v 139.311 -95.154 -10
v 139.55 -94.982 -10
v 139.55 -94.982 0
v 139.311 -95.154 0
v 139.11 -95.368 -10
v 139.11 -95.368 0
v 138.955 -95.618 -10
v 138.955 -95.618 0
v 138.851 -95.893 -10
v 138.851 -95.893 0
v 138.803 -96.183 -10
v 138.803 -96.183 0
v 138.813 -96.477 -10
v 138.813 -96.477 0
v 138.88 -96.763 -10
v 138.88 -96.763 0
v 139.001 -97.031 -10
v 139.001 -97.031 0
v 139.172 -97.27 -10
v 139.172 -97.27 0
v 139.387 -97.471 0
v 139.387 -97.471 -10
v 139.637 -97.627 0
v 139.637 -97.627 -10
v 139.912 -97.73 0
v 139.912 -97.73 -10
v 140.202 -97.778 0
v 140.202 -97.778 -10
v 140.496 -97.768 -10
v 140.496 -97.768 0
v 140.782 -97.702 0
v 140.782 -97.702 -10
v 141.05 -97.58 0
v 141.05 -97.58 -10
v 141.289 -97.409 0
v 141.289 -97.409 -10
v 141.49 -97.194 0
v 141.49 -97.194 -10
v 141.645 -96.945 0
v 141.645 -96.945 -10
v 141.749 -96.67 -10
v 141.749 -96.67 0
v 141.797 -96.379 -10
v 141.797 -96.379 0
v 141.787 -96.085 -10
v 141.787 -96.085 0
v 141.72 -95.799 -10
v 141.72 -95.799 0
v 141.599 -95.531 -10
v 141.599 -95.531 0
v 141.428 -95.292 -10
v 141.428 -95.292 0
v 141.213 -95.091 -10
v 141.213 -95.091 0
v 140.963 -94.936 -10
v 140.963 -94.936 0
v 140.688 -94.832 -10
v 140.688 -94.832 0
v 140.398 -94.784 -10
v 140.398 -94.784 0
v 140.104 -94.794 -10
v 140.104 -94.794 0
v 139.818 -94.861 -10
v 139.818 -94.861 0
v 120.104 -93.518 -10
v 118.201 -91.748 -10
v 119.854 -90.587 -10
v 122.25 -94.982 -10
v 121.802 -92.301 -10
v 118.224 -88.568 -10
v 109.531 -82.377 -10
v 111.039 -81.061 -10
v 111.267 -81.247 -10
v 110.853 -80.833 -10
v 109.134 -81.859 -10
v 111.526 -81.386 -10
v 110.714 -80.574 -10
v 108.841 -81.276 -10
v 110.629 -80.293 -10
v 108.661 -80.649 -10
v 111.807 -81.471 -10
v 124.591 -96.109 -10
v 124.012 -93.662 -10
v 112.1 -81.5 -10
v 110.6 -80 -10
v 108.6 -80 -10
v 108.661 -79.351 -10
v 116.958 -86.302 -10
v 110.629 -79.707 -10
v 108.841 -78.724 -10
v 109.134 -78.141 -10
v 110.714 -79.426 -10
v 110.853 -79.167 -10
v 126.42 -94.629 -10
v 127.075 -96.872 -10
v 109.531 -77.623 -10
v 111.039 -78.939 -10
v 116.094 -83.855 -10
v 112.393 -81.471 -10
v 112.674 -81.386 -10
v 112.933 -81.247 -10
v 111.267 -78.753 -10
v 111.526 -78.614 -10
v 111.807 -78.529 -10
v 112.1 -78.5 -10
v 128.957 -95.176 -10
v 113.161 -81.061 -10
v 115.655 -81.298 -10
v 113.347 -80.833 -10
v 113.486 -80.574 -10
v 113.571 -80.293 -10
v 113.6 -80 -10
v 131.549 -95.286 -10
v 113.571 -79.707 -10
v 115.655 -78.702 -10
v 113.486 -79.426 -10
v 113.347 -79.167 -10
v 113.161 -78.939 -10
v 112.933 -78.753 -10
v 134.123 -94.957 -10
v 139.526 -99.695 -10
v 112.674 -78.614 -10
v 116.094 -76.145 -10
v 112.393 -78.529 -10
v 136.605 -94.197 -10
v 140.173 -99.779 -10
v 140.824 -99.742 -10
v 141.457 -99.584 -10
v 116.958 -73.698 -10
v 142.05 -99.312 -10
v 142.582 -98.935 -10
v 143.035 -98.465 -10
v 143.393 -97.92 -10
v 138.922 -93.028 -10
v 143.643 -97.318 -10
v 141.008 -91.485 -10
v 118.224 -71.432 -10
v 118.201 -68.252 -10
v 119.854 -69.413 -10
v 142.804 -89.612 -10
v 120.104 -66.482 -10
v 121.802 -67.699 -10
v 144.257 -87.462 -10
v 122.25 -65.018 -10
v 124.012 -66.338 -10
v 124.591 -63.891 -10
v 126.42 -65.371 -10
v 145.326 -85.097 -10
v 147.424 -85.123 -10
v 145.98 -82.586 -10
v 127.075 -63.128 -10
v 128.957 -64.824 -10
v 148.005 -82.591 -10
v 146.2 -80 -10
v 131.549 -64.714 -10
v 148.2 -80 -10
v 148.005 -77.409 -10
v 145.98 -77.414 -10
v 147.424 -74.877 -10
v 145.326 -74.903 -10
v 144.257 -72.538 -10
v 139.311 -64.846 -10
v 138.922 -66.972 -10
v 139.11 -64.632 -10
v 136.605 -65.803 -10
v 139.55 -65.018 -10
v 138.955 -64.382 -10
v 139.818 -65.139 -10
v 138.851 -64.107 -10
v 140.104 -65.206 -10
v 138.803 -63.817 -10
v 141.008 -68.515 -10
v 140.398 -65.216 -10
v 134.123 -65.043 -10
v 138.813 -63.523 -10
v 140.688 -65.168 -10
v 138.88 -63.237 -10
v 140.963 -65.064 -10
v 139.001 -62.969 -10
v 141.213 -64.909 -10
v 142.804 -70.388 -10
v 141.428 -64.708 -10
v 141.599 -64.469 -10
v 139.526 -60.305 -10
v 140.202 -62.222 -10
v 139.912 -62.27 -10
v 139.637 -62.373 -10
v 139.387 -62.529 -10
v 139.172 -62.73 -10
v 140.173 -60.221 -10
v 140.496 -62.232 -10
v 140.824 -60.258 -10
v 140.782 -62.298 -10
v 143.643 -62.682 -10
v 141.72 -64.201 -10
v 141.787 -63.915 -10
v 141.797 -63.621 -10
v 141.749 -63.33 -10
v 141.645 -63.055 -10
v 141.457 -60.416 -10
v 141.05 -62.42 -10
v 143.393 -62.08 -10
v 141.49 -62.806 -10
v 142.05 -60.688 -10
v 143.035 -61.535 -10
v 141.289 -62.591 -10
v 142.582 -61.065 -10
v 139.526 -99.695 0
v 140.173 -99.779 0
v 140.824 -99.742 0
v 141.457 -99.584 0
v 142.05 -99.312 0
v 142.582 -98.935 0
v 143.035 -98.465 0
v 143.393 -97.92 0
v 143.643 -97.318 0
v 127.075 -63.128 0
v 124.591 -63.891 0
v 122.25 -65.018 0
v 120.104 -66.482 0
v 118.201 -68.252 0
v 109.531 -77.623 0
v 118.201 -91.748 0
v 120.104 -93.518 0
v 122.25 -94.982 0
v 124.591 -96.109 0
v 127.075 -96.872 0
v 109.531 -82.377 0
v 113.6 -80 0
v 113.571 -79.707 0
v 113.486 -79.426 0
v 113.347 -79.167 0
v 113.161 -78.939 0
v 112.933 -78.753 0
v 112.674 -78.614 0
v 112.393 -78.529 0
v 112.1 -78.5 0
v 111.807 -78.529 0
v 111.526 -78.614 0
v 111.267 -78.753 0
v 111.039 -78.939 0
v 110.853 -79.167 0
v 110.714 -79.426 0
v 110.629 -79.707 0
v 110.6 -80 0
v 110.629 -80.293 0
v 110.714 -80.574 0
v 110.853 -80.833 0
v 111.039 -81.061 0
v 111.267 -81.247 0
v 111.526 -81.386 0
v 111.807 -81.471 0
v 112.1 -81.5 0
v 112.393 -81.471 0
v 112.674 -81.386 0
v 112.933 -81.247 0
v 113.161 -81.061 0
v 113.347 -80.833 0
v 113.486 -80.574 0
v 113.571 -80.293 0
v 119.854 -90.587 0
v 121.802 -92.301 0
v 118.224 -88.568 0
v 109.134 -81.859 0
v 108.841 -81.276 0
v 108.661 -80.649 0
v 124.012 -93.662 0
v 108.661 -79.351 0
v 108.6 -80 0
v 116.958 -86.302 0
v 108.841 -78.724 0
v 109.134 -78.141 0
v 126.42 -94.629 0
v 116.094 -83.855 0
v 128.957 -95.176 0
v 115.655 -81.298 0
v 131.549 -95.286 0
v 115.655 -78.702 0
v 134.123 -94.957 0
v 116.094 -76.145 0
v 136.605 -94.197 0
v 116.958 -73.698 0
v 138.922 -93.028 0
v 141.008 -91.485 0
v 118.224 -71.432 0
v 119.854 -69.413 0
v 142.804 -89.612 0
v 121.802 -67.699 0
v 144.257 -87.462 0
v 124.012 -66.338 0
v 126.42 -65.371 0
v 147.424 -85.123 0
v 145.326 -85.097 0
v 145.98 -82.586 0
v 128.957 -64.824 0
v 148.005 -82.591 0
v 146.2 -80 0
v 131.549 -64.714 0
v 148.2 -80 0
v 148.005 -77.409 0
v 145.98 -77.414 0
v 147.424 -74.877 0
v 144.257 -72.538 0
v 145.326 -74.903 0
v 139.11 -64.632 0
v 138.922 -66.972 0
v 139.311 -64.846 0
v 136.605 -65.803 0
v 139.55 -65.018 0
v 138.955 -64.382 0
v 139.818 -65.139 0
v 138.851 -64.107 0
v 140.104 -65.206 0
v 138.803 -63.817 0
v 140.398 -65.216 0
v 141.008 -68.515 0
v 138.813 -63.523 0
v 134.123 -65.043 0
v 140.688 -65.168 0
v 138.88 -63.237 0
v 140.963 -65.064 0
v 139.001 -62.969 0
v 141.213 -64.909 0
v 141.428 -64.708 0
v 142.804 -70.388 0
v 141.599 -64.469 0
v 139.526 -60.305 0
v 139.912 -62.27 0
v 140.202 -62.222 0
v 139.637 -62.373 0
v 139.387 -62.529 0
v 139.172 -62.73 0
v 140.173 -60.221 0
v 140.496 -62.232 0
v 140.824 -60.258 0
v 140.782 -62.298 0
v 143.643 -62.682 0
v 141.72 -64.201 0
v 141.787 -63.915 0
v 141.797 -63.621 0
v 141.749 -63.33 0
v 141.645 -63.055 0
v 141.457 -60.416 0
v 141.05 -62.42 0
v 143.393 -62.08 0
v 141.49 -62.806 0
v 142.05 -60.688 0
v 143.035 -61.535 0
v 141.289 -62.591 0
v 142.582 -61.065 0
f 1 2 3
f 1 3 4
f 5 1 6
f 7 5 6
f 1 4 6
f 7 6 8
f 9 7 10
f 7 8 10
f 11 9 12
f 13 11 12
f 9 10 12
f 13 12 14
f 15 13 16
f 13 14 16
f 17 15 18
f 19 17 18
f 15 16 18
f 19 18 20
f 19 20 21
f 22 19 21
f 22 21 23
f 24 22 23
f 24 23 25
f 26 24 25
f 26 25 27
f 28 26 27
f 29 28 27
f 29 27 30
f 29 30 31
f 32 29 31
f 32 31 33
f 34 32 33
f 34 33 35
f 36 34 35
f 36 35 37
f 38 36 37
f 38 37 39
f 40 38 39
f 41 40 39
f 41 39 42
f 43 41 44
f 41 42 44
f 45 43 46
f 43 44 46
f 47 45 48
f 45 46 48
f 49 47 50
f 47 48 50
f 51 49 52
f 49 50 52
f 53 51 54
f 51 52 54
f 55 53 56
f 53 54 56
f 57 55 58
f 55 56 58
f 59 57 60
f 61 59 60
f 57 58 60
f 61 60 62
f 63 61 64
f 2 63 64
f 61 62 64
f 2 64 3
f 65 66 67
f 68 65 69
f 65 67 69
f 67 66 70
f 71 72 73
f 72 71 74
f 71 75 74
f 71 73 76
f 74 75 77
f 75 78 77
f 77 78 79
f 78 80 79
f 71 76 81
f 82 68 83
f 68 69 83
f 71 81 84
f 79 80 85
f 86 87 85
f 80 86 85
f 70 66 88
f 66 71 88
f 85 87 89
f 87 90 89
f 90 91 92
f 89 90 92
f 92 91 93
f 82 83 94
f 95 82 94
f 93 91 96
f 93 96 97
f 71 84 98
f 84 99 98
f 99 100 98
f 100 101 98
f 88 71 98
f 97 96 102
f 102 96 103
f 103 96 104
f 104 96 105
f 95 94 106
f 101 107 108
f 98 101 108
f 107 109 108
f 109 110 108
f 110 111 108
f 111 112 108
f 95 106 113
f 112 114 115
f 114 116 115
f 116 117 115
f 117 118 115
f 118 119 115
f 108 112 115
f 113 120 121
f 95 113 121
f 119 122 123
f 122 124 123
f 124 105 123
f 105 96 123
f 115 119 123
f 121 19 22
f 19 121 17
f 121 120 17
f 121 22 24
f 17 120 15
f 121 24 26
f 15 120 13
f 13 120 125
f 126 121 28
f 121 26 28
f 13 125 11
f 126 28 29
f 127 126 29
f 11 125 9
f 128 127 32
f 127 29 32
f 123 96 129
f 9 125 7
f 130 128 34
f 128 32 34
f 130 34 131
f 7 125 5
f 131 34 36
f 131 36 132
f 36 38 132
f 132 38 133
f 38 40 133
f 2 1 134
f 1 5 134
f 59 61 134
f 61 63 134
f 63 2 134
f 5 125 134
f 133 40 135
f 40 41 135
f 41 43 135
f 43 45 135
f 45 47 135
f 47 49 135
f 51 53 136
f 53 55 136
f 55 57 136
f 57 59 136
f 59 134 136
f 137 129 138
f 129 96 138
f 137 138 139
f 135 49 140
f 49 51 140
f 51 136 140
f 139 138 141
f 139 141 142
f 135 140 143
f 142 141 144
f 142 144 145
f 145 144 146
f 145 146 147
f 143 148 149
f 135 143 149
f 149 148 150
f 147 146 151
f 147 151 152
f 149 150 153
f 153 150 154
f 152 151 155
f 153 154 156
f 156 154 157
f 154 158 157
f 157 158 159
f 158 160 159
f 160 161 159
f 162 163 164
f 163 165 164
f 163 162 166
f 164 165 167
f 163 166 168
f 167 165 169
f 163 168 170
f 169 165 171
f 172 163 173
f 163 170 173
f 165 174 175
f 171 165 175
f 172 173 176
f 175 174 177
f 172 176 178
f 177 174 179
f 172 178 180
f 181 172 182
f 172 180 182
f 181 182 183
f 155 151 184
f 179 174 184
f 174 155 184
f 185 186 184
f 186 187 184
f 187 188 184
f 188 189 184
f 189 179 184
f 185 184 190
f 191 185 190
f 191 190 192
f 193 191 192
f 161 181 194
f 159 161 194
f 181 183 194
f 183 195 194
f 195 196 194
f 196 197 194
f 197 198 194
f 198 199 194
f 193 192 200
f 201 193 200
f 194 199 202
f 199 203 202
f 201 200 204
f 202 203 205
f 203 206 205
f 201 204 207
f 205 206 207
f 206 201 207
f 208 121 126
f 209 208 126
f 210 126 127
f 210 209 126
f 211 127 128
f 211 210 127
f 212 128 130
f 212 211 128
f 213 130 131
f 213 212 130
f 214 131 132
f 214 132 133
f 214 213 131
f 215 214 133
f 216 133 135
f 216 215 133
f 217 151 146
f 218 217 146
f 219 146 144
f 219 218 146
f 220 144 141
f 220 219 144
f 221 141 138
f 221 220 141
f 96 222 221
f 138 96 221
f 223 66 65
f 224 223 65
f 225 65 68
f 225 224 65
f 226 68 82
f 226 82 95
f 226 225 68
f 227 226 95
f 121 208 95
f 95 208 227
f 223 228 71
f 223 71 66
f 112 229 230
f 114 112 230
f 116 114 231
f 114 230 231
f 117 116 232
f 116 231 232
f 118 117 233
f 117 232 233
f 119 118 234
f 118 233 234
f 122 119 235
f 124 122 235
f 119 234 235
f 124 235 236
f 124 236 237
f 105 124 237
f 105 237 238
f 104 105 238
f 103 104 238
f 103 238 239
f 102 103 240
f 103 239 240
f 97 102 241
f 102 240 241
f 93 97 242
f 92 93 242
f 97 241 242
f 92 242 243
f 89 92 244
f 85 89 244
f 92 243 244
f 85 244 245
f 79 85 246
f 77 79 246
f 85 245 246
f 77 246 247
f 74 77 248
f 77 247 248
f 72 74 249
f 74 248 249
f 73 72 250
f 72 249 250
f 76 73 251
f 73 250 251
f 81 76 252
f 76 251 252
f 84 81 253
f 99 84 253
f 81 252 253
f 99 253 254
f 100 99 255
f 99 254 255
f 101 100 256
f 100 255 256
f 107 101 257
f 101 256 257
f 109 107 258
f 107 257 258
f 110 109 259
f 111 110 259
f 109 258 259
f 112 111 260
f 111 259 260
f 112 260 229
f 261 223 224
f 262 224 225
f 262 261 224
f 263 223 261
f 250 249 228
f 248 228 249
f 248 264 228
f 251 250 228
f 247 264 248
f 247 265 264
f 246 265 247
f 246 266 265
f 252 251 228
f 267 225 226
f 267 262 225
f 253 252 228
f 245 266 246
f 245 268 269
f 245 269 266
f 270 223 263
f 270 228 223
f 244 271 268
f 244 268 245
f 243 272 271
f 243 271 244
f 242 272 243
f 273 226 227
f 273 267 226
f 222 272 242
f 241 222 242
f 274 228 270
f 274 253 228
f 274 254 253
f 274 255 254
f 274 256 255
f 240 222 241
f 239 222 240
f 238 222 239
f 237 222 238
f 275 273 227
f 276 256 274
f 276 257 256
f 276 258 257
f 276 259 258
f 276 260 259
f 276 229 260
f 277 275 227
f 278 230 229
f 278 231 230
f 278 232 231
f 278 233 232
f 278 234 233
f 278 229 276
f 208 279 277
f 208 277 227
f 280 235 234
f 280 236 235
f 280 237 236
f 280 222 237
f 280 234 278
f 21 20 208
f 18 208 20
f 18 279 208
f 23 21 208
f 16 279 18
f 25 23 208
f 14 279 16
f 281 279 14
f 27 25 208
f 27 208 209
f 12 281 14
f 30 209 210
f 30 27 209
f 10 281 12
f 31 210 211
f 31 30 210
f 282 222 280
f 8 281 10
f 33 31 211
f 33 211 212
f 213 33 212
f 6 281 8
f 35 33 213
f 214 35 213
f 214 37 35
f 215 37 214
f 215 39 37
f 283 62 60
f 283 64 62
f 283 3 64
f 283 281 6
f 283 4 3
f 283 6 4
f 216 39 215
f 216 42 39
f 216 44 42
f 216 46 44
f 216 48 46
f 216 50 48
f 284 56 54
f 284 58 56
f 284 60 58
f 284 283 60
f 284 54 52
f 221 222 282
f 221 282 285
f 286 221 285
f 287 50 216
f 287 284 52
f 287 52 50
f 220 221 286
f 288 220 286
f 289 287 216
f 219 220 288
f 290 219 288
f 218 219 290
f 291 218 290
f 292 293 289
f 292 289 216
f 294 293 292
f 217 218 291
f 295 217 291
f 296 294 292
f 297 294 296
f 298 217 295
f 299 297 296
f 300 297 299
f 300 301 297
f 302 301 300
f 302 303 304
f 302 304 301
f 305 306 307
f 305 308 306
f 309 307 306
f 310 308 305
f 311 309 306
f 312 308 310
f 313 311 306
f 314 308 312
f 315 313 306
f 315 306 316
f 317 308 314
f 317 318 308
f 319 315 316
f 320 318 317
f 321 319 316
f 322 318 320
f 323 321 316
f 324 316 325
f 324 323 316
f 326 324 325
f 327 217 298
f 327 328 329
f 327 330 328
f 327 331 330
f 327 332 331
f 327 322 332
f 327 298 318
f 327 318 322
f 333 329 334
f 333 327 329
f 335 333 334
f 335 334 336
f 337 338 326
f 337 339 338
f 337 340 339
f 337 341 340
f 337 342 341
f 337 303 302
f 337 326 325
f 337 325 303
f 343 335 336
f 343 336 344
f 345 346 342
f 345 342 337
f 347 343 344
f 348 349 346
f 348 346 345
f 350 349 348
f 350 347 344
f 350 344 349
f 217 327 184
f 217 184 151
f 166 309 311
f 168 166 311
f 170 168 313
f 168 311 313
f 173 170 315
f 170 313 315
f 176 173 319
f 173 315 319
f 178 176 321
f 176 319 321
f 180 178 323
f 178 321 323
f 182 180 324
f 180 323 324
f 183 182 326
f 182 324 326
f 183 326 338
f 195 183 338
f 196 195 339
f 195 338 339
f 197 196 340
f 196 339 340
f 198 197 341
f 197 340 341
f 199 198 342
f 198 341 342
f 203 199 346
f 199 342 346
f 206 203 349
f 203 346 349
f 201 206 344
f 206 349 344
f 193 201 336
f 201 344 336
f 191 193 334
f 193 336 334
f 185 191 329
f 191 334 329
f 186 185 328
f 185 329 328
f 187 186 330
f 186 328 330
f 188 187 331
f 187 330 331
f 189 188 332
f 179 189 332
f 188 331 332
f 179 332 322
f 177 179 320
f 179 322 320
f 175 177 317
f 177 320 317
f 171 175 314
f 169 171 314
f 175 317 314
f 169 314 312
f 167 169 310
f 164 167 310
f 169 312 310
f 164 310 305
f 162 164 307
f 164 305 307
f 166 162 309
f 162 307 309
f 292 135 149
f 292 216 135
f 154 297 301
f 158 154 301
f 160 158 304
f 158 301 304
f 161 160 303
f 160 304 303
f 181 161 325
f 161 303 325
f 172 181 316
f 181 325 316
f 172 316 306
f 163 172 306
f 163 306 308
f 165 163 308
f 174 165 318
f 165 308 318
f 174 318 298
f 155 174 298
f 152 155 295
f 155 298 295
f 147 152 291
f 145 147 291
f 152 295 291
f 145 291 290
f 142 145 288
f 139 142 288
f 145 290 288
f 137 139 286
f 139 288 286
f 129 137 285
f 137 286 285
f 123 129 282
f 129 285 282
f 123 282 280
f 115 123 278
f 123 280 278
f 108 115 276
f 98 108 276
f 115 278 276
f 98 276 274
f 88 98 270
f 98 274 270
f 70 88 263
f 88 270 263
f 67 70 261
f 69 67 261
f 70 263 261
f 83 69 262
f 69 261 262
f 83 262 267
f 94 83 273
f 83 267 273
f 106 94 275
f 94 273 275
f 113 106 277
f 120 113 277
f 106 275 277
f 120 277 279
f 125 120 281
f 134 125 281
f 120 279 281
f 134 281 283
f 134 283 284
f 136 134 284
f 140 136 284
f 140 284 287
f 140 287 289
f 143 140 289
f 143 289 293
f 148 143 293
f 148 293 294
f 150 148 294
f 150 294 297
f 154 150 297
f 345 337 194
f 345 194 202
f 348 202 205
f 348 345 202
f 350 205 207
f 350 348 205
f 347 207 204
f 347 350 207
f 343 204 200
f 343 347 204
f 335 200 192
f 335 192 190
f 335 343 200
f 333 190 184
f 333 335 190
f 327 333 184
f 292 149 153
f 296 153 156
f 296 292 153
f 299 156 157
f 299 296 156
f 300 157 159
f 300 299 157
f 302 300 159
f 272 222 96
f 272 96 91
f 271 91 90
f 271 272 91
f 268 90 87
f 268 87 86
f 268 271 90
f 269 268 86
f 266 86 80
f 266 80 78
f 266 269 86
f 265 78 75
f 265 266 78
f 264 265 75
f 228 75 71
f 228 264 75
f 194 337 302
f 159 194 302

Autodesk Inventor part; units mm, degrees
ref_plane "YZ Plane" through (0, 0, 0) normal (1, 0, 0) x (0, 1, 0)
ref_plane "XZ Plane" through (0, 0, 0) normal (0, 1, 0) x (-1, 0, 0)
ref_plane "XY Plane" through (0, 0, 0) normal (0, 0, 1) x (1, 0, 0)
sketch "Sketch1" plane through (0, 0, 0) normal (0, 0, 1) x (1, 0, 0)
  circle A0 centre (130.9, -80) radius 15 construction
  line L0 (0, 0) -> (117.2543, 0) construction
  line L1 (-60.9, -65.8) -> (60.9, -65.8) projected
  line L2 (60.9, -94.2) -> (60.9, -65.8) projected
  line L3 (60.9, -94.2) -> (-60.9, -94.2) projected
  line L4 (-60.9, -65.8) -> (-60.9, -94.2) projected
  circle A1 centre (130.9, -80) radius 15.3
  circle A2 centre (130.9, -80) radius 17.3
  circle A3 centre (112.1, -80) radius 1.5
  circle A4 centre (112.1, -80) radius 3.5
  line L5 (109.5309, -77.6231) -> (118.2011, -68.2515)
  line L6 (109.5309, -82.3769) -> (118.2011, -91.7485)
  circle A5 centre (-45.9, -80) radius 3.15 projected
  circle A6 centre (45.9, -80) radius 3.15 projected
  point P0 (60.9, -80)
  dimension "d0" = 30
  dimension "d1" = 70
  dimension "d2" = 0.3
  dimension "d3" = 2
  dimension "d4" = 3
  dimension "d6" = 2
extrude "Extrusion1" add sketch "Sketch1" against normal blind 10 contours A4 A2 | A4 A2 | A4 L5 A2 | A2 A4 | A2 L6 A4
pattern_circular "Circular Pattern1" count 3 over 360 about axis through (130.9, -80, 0) along (0, 0, -1) of "Extrusion1"
properties part number "Chamber Holder"
